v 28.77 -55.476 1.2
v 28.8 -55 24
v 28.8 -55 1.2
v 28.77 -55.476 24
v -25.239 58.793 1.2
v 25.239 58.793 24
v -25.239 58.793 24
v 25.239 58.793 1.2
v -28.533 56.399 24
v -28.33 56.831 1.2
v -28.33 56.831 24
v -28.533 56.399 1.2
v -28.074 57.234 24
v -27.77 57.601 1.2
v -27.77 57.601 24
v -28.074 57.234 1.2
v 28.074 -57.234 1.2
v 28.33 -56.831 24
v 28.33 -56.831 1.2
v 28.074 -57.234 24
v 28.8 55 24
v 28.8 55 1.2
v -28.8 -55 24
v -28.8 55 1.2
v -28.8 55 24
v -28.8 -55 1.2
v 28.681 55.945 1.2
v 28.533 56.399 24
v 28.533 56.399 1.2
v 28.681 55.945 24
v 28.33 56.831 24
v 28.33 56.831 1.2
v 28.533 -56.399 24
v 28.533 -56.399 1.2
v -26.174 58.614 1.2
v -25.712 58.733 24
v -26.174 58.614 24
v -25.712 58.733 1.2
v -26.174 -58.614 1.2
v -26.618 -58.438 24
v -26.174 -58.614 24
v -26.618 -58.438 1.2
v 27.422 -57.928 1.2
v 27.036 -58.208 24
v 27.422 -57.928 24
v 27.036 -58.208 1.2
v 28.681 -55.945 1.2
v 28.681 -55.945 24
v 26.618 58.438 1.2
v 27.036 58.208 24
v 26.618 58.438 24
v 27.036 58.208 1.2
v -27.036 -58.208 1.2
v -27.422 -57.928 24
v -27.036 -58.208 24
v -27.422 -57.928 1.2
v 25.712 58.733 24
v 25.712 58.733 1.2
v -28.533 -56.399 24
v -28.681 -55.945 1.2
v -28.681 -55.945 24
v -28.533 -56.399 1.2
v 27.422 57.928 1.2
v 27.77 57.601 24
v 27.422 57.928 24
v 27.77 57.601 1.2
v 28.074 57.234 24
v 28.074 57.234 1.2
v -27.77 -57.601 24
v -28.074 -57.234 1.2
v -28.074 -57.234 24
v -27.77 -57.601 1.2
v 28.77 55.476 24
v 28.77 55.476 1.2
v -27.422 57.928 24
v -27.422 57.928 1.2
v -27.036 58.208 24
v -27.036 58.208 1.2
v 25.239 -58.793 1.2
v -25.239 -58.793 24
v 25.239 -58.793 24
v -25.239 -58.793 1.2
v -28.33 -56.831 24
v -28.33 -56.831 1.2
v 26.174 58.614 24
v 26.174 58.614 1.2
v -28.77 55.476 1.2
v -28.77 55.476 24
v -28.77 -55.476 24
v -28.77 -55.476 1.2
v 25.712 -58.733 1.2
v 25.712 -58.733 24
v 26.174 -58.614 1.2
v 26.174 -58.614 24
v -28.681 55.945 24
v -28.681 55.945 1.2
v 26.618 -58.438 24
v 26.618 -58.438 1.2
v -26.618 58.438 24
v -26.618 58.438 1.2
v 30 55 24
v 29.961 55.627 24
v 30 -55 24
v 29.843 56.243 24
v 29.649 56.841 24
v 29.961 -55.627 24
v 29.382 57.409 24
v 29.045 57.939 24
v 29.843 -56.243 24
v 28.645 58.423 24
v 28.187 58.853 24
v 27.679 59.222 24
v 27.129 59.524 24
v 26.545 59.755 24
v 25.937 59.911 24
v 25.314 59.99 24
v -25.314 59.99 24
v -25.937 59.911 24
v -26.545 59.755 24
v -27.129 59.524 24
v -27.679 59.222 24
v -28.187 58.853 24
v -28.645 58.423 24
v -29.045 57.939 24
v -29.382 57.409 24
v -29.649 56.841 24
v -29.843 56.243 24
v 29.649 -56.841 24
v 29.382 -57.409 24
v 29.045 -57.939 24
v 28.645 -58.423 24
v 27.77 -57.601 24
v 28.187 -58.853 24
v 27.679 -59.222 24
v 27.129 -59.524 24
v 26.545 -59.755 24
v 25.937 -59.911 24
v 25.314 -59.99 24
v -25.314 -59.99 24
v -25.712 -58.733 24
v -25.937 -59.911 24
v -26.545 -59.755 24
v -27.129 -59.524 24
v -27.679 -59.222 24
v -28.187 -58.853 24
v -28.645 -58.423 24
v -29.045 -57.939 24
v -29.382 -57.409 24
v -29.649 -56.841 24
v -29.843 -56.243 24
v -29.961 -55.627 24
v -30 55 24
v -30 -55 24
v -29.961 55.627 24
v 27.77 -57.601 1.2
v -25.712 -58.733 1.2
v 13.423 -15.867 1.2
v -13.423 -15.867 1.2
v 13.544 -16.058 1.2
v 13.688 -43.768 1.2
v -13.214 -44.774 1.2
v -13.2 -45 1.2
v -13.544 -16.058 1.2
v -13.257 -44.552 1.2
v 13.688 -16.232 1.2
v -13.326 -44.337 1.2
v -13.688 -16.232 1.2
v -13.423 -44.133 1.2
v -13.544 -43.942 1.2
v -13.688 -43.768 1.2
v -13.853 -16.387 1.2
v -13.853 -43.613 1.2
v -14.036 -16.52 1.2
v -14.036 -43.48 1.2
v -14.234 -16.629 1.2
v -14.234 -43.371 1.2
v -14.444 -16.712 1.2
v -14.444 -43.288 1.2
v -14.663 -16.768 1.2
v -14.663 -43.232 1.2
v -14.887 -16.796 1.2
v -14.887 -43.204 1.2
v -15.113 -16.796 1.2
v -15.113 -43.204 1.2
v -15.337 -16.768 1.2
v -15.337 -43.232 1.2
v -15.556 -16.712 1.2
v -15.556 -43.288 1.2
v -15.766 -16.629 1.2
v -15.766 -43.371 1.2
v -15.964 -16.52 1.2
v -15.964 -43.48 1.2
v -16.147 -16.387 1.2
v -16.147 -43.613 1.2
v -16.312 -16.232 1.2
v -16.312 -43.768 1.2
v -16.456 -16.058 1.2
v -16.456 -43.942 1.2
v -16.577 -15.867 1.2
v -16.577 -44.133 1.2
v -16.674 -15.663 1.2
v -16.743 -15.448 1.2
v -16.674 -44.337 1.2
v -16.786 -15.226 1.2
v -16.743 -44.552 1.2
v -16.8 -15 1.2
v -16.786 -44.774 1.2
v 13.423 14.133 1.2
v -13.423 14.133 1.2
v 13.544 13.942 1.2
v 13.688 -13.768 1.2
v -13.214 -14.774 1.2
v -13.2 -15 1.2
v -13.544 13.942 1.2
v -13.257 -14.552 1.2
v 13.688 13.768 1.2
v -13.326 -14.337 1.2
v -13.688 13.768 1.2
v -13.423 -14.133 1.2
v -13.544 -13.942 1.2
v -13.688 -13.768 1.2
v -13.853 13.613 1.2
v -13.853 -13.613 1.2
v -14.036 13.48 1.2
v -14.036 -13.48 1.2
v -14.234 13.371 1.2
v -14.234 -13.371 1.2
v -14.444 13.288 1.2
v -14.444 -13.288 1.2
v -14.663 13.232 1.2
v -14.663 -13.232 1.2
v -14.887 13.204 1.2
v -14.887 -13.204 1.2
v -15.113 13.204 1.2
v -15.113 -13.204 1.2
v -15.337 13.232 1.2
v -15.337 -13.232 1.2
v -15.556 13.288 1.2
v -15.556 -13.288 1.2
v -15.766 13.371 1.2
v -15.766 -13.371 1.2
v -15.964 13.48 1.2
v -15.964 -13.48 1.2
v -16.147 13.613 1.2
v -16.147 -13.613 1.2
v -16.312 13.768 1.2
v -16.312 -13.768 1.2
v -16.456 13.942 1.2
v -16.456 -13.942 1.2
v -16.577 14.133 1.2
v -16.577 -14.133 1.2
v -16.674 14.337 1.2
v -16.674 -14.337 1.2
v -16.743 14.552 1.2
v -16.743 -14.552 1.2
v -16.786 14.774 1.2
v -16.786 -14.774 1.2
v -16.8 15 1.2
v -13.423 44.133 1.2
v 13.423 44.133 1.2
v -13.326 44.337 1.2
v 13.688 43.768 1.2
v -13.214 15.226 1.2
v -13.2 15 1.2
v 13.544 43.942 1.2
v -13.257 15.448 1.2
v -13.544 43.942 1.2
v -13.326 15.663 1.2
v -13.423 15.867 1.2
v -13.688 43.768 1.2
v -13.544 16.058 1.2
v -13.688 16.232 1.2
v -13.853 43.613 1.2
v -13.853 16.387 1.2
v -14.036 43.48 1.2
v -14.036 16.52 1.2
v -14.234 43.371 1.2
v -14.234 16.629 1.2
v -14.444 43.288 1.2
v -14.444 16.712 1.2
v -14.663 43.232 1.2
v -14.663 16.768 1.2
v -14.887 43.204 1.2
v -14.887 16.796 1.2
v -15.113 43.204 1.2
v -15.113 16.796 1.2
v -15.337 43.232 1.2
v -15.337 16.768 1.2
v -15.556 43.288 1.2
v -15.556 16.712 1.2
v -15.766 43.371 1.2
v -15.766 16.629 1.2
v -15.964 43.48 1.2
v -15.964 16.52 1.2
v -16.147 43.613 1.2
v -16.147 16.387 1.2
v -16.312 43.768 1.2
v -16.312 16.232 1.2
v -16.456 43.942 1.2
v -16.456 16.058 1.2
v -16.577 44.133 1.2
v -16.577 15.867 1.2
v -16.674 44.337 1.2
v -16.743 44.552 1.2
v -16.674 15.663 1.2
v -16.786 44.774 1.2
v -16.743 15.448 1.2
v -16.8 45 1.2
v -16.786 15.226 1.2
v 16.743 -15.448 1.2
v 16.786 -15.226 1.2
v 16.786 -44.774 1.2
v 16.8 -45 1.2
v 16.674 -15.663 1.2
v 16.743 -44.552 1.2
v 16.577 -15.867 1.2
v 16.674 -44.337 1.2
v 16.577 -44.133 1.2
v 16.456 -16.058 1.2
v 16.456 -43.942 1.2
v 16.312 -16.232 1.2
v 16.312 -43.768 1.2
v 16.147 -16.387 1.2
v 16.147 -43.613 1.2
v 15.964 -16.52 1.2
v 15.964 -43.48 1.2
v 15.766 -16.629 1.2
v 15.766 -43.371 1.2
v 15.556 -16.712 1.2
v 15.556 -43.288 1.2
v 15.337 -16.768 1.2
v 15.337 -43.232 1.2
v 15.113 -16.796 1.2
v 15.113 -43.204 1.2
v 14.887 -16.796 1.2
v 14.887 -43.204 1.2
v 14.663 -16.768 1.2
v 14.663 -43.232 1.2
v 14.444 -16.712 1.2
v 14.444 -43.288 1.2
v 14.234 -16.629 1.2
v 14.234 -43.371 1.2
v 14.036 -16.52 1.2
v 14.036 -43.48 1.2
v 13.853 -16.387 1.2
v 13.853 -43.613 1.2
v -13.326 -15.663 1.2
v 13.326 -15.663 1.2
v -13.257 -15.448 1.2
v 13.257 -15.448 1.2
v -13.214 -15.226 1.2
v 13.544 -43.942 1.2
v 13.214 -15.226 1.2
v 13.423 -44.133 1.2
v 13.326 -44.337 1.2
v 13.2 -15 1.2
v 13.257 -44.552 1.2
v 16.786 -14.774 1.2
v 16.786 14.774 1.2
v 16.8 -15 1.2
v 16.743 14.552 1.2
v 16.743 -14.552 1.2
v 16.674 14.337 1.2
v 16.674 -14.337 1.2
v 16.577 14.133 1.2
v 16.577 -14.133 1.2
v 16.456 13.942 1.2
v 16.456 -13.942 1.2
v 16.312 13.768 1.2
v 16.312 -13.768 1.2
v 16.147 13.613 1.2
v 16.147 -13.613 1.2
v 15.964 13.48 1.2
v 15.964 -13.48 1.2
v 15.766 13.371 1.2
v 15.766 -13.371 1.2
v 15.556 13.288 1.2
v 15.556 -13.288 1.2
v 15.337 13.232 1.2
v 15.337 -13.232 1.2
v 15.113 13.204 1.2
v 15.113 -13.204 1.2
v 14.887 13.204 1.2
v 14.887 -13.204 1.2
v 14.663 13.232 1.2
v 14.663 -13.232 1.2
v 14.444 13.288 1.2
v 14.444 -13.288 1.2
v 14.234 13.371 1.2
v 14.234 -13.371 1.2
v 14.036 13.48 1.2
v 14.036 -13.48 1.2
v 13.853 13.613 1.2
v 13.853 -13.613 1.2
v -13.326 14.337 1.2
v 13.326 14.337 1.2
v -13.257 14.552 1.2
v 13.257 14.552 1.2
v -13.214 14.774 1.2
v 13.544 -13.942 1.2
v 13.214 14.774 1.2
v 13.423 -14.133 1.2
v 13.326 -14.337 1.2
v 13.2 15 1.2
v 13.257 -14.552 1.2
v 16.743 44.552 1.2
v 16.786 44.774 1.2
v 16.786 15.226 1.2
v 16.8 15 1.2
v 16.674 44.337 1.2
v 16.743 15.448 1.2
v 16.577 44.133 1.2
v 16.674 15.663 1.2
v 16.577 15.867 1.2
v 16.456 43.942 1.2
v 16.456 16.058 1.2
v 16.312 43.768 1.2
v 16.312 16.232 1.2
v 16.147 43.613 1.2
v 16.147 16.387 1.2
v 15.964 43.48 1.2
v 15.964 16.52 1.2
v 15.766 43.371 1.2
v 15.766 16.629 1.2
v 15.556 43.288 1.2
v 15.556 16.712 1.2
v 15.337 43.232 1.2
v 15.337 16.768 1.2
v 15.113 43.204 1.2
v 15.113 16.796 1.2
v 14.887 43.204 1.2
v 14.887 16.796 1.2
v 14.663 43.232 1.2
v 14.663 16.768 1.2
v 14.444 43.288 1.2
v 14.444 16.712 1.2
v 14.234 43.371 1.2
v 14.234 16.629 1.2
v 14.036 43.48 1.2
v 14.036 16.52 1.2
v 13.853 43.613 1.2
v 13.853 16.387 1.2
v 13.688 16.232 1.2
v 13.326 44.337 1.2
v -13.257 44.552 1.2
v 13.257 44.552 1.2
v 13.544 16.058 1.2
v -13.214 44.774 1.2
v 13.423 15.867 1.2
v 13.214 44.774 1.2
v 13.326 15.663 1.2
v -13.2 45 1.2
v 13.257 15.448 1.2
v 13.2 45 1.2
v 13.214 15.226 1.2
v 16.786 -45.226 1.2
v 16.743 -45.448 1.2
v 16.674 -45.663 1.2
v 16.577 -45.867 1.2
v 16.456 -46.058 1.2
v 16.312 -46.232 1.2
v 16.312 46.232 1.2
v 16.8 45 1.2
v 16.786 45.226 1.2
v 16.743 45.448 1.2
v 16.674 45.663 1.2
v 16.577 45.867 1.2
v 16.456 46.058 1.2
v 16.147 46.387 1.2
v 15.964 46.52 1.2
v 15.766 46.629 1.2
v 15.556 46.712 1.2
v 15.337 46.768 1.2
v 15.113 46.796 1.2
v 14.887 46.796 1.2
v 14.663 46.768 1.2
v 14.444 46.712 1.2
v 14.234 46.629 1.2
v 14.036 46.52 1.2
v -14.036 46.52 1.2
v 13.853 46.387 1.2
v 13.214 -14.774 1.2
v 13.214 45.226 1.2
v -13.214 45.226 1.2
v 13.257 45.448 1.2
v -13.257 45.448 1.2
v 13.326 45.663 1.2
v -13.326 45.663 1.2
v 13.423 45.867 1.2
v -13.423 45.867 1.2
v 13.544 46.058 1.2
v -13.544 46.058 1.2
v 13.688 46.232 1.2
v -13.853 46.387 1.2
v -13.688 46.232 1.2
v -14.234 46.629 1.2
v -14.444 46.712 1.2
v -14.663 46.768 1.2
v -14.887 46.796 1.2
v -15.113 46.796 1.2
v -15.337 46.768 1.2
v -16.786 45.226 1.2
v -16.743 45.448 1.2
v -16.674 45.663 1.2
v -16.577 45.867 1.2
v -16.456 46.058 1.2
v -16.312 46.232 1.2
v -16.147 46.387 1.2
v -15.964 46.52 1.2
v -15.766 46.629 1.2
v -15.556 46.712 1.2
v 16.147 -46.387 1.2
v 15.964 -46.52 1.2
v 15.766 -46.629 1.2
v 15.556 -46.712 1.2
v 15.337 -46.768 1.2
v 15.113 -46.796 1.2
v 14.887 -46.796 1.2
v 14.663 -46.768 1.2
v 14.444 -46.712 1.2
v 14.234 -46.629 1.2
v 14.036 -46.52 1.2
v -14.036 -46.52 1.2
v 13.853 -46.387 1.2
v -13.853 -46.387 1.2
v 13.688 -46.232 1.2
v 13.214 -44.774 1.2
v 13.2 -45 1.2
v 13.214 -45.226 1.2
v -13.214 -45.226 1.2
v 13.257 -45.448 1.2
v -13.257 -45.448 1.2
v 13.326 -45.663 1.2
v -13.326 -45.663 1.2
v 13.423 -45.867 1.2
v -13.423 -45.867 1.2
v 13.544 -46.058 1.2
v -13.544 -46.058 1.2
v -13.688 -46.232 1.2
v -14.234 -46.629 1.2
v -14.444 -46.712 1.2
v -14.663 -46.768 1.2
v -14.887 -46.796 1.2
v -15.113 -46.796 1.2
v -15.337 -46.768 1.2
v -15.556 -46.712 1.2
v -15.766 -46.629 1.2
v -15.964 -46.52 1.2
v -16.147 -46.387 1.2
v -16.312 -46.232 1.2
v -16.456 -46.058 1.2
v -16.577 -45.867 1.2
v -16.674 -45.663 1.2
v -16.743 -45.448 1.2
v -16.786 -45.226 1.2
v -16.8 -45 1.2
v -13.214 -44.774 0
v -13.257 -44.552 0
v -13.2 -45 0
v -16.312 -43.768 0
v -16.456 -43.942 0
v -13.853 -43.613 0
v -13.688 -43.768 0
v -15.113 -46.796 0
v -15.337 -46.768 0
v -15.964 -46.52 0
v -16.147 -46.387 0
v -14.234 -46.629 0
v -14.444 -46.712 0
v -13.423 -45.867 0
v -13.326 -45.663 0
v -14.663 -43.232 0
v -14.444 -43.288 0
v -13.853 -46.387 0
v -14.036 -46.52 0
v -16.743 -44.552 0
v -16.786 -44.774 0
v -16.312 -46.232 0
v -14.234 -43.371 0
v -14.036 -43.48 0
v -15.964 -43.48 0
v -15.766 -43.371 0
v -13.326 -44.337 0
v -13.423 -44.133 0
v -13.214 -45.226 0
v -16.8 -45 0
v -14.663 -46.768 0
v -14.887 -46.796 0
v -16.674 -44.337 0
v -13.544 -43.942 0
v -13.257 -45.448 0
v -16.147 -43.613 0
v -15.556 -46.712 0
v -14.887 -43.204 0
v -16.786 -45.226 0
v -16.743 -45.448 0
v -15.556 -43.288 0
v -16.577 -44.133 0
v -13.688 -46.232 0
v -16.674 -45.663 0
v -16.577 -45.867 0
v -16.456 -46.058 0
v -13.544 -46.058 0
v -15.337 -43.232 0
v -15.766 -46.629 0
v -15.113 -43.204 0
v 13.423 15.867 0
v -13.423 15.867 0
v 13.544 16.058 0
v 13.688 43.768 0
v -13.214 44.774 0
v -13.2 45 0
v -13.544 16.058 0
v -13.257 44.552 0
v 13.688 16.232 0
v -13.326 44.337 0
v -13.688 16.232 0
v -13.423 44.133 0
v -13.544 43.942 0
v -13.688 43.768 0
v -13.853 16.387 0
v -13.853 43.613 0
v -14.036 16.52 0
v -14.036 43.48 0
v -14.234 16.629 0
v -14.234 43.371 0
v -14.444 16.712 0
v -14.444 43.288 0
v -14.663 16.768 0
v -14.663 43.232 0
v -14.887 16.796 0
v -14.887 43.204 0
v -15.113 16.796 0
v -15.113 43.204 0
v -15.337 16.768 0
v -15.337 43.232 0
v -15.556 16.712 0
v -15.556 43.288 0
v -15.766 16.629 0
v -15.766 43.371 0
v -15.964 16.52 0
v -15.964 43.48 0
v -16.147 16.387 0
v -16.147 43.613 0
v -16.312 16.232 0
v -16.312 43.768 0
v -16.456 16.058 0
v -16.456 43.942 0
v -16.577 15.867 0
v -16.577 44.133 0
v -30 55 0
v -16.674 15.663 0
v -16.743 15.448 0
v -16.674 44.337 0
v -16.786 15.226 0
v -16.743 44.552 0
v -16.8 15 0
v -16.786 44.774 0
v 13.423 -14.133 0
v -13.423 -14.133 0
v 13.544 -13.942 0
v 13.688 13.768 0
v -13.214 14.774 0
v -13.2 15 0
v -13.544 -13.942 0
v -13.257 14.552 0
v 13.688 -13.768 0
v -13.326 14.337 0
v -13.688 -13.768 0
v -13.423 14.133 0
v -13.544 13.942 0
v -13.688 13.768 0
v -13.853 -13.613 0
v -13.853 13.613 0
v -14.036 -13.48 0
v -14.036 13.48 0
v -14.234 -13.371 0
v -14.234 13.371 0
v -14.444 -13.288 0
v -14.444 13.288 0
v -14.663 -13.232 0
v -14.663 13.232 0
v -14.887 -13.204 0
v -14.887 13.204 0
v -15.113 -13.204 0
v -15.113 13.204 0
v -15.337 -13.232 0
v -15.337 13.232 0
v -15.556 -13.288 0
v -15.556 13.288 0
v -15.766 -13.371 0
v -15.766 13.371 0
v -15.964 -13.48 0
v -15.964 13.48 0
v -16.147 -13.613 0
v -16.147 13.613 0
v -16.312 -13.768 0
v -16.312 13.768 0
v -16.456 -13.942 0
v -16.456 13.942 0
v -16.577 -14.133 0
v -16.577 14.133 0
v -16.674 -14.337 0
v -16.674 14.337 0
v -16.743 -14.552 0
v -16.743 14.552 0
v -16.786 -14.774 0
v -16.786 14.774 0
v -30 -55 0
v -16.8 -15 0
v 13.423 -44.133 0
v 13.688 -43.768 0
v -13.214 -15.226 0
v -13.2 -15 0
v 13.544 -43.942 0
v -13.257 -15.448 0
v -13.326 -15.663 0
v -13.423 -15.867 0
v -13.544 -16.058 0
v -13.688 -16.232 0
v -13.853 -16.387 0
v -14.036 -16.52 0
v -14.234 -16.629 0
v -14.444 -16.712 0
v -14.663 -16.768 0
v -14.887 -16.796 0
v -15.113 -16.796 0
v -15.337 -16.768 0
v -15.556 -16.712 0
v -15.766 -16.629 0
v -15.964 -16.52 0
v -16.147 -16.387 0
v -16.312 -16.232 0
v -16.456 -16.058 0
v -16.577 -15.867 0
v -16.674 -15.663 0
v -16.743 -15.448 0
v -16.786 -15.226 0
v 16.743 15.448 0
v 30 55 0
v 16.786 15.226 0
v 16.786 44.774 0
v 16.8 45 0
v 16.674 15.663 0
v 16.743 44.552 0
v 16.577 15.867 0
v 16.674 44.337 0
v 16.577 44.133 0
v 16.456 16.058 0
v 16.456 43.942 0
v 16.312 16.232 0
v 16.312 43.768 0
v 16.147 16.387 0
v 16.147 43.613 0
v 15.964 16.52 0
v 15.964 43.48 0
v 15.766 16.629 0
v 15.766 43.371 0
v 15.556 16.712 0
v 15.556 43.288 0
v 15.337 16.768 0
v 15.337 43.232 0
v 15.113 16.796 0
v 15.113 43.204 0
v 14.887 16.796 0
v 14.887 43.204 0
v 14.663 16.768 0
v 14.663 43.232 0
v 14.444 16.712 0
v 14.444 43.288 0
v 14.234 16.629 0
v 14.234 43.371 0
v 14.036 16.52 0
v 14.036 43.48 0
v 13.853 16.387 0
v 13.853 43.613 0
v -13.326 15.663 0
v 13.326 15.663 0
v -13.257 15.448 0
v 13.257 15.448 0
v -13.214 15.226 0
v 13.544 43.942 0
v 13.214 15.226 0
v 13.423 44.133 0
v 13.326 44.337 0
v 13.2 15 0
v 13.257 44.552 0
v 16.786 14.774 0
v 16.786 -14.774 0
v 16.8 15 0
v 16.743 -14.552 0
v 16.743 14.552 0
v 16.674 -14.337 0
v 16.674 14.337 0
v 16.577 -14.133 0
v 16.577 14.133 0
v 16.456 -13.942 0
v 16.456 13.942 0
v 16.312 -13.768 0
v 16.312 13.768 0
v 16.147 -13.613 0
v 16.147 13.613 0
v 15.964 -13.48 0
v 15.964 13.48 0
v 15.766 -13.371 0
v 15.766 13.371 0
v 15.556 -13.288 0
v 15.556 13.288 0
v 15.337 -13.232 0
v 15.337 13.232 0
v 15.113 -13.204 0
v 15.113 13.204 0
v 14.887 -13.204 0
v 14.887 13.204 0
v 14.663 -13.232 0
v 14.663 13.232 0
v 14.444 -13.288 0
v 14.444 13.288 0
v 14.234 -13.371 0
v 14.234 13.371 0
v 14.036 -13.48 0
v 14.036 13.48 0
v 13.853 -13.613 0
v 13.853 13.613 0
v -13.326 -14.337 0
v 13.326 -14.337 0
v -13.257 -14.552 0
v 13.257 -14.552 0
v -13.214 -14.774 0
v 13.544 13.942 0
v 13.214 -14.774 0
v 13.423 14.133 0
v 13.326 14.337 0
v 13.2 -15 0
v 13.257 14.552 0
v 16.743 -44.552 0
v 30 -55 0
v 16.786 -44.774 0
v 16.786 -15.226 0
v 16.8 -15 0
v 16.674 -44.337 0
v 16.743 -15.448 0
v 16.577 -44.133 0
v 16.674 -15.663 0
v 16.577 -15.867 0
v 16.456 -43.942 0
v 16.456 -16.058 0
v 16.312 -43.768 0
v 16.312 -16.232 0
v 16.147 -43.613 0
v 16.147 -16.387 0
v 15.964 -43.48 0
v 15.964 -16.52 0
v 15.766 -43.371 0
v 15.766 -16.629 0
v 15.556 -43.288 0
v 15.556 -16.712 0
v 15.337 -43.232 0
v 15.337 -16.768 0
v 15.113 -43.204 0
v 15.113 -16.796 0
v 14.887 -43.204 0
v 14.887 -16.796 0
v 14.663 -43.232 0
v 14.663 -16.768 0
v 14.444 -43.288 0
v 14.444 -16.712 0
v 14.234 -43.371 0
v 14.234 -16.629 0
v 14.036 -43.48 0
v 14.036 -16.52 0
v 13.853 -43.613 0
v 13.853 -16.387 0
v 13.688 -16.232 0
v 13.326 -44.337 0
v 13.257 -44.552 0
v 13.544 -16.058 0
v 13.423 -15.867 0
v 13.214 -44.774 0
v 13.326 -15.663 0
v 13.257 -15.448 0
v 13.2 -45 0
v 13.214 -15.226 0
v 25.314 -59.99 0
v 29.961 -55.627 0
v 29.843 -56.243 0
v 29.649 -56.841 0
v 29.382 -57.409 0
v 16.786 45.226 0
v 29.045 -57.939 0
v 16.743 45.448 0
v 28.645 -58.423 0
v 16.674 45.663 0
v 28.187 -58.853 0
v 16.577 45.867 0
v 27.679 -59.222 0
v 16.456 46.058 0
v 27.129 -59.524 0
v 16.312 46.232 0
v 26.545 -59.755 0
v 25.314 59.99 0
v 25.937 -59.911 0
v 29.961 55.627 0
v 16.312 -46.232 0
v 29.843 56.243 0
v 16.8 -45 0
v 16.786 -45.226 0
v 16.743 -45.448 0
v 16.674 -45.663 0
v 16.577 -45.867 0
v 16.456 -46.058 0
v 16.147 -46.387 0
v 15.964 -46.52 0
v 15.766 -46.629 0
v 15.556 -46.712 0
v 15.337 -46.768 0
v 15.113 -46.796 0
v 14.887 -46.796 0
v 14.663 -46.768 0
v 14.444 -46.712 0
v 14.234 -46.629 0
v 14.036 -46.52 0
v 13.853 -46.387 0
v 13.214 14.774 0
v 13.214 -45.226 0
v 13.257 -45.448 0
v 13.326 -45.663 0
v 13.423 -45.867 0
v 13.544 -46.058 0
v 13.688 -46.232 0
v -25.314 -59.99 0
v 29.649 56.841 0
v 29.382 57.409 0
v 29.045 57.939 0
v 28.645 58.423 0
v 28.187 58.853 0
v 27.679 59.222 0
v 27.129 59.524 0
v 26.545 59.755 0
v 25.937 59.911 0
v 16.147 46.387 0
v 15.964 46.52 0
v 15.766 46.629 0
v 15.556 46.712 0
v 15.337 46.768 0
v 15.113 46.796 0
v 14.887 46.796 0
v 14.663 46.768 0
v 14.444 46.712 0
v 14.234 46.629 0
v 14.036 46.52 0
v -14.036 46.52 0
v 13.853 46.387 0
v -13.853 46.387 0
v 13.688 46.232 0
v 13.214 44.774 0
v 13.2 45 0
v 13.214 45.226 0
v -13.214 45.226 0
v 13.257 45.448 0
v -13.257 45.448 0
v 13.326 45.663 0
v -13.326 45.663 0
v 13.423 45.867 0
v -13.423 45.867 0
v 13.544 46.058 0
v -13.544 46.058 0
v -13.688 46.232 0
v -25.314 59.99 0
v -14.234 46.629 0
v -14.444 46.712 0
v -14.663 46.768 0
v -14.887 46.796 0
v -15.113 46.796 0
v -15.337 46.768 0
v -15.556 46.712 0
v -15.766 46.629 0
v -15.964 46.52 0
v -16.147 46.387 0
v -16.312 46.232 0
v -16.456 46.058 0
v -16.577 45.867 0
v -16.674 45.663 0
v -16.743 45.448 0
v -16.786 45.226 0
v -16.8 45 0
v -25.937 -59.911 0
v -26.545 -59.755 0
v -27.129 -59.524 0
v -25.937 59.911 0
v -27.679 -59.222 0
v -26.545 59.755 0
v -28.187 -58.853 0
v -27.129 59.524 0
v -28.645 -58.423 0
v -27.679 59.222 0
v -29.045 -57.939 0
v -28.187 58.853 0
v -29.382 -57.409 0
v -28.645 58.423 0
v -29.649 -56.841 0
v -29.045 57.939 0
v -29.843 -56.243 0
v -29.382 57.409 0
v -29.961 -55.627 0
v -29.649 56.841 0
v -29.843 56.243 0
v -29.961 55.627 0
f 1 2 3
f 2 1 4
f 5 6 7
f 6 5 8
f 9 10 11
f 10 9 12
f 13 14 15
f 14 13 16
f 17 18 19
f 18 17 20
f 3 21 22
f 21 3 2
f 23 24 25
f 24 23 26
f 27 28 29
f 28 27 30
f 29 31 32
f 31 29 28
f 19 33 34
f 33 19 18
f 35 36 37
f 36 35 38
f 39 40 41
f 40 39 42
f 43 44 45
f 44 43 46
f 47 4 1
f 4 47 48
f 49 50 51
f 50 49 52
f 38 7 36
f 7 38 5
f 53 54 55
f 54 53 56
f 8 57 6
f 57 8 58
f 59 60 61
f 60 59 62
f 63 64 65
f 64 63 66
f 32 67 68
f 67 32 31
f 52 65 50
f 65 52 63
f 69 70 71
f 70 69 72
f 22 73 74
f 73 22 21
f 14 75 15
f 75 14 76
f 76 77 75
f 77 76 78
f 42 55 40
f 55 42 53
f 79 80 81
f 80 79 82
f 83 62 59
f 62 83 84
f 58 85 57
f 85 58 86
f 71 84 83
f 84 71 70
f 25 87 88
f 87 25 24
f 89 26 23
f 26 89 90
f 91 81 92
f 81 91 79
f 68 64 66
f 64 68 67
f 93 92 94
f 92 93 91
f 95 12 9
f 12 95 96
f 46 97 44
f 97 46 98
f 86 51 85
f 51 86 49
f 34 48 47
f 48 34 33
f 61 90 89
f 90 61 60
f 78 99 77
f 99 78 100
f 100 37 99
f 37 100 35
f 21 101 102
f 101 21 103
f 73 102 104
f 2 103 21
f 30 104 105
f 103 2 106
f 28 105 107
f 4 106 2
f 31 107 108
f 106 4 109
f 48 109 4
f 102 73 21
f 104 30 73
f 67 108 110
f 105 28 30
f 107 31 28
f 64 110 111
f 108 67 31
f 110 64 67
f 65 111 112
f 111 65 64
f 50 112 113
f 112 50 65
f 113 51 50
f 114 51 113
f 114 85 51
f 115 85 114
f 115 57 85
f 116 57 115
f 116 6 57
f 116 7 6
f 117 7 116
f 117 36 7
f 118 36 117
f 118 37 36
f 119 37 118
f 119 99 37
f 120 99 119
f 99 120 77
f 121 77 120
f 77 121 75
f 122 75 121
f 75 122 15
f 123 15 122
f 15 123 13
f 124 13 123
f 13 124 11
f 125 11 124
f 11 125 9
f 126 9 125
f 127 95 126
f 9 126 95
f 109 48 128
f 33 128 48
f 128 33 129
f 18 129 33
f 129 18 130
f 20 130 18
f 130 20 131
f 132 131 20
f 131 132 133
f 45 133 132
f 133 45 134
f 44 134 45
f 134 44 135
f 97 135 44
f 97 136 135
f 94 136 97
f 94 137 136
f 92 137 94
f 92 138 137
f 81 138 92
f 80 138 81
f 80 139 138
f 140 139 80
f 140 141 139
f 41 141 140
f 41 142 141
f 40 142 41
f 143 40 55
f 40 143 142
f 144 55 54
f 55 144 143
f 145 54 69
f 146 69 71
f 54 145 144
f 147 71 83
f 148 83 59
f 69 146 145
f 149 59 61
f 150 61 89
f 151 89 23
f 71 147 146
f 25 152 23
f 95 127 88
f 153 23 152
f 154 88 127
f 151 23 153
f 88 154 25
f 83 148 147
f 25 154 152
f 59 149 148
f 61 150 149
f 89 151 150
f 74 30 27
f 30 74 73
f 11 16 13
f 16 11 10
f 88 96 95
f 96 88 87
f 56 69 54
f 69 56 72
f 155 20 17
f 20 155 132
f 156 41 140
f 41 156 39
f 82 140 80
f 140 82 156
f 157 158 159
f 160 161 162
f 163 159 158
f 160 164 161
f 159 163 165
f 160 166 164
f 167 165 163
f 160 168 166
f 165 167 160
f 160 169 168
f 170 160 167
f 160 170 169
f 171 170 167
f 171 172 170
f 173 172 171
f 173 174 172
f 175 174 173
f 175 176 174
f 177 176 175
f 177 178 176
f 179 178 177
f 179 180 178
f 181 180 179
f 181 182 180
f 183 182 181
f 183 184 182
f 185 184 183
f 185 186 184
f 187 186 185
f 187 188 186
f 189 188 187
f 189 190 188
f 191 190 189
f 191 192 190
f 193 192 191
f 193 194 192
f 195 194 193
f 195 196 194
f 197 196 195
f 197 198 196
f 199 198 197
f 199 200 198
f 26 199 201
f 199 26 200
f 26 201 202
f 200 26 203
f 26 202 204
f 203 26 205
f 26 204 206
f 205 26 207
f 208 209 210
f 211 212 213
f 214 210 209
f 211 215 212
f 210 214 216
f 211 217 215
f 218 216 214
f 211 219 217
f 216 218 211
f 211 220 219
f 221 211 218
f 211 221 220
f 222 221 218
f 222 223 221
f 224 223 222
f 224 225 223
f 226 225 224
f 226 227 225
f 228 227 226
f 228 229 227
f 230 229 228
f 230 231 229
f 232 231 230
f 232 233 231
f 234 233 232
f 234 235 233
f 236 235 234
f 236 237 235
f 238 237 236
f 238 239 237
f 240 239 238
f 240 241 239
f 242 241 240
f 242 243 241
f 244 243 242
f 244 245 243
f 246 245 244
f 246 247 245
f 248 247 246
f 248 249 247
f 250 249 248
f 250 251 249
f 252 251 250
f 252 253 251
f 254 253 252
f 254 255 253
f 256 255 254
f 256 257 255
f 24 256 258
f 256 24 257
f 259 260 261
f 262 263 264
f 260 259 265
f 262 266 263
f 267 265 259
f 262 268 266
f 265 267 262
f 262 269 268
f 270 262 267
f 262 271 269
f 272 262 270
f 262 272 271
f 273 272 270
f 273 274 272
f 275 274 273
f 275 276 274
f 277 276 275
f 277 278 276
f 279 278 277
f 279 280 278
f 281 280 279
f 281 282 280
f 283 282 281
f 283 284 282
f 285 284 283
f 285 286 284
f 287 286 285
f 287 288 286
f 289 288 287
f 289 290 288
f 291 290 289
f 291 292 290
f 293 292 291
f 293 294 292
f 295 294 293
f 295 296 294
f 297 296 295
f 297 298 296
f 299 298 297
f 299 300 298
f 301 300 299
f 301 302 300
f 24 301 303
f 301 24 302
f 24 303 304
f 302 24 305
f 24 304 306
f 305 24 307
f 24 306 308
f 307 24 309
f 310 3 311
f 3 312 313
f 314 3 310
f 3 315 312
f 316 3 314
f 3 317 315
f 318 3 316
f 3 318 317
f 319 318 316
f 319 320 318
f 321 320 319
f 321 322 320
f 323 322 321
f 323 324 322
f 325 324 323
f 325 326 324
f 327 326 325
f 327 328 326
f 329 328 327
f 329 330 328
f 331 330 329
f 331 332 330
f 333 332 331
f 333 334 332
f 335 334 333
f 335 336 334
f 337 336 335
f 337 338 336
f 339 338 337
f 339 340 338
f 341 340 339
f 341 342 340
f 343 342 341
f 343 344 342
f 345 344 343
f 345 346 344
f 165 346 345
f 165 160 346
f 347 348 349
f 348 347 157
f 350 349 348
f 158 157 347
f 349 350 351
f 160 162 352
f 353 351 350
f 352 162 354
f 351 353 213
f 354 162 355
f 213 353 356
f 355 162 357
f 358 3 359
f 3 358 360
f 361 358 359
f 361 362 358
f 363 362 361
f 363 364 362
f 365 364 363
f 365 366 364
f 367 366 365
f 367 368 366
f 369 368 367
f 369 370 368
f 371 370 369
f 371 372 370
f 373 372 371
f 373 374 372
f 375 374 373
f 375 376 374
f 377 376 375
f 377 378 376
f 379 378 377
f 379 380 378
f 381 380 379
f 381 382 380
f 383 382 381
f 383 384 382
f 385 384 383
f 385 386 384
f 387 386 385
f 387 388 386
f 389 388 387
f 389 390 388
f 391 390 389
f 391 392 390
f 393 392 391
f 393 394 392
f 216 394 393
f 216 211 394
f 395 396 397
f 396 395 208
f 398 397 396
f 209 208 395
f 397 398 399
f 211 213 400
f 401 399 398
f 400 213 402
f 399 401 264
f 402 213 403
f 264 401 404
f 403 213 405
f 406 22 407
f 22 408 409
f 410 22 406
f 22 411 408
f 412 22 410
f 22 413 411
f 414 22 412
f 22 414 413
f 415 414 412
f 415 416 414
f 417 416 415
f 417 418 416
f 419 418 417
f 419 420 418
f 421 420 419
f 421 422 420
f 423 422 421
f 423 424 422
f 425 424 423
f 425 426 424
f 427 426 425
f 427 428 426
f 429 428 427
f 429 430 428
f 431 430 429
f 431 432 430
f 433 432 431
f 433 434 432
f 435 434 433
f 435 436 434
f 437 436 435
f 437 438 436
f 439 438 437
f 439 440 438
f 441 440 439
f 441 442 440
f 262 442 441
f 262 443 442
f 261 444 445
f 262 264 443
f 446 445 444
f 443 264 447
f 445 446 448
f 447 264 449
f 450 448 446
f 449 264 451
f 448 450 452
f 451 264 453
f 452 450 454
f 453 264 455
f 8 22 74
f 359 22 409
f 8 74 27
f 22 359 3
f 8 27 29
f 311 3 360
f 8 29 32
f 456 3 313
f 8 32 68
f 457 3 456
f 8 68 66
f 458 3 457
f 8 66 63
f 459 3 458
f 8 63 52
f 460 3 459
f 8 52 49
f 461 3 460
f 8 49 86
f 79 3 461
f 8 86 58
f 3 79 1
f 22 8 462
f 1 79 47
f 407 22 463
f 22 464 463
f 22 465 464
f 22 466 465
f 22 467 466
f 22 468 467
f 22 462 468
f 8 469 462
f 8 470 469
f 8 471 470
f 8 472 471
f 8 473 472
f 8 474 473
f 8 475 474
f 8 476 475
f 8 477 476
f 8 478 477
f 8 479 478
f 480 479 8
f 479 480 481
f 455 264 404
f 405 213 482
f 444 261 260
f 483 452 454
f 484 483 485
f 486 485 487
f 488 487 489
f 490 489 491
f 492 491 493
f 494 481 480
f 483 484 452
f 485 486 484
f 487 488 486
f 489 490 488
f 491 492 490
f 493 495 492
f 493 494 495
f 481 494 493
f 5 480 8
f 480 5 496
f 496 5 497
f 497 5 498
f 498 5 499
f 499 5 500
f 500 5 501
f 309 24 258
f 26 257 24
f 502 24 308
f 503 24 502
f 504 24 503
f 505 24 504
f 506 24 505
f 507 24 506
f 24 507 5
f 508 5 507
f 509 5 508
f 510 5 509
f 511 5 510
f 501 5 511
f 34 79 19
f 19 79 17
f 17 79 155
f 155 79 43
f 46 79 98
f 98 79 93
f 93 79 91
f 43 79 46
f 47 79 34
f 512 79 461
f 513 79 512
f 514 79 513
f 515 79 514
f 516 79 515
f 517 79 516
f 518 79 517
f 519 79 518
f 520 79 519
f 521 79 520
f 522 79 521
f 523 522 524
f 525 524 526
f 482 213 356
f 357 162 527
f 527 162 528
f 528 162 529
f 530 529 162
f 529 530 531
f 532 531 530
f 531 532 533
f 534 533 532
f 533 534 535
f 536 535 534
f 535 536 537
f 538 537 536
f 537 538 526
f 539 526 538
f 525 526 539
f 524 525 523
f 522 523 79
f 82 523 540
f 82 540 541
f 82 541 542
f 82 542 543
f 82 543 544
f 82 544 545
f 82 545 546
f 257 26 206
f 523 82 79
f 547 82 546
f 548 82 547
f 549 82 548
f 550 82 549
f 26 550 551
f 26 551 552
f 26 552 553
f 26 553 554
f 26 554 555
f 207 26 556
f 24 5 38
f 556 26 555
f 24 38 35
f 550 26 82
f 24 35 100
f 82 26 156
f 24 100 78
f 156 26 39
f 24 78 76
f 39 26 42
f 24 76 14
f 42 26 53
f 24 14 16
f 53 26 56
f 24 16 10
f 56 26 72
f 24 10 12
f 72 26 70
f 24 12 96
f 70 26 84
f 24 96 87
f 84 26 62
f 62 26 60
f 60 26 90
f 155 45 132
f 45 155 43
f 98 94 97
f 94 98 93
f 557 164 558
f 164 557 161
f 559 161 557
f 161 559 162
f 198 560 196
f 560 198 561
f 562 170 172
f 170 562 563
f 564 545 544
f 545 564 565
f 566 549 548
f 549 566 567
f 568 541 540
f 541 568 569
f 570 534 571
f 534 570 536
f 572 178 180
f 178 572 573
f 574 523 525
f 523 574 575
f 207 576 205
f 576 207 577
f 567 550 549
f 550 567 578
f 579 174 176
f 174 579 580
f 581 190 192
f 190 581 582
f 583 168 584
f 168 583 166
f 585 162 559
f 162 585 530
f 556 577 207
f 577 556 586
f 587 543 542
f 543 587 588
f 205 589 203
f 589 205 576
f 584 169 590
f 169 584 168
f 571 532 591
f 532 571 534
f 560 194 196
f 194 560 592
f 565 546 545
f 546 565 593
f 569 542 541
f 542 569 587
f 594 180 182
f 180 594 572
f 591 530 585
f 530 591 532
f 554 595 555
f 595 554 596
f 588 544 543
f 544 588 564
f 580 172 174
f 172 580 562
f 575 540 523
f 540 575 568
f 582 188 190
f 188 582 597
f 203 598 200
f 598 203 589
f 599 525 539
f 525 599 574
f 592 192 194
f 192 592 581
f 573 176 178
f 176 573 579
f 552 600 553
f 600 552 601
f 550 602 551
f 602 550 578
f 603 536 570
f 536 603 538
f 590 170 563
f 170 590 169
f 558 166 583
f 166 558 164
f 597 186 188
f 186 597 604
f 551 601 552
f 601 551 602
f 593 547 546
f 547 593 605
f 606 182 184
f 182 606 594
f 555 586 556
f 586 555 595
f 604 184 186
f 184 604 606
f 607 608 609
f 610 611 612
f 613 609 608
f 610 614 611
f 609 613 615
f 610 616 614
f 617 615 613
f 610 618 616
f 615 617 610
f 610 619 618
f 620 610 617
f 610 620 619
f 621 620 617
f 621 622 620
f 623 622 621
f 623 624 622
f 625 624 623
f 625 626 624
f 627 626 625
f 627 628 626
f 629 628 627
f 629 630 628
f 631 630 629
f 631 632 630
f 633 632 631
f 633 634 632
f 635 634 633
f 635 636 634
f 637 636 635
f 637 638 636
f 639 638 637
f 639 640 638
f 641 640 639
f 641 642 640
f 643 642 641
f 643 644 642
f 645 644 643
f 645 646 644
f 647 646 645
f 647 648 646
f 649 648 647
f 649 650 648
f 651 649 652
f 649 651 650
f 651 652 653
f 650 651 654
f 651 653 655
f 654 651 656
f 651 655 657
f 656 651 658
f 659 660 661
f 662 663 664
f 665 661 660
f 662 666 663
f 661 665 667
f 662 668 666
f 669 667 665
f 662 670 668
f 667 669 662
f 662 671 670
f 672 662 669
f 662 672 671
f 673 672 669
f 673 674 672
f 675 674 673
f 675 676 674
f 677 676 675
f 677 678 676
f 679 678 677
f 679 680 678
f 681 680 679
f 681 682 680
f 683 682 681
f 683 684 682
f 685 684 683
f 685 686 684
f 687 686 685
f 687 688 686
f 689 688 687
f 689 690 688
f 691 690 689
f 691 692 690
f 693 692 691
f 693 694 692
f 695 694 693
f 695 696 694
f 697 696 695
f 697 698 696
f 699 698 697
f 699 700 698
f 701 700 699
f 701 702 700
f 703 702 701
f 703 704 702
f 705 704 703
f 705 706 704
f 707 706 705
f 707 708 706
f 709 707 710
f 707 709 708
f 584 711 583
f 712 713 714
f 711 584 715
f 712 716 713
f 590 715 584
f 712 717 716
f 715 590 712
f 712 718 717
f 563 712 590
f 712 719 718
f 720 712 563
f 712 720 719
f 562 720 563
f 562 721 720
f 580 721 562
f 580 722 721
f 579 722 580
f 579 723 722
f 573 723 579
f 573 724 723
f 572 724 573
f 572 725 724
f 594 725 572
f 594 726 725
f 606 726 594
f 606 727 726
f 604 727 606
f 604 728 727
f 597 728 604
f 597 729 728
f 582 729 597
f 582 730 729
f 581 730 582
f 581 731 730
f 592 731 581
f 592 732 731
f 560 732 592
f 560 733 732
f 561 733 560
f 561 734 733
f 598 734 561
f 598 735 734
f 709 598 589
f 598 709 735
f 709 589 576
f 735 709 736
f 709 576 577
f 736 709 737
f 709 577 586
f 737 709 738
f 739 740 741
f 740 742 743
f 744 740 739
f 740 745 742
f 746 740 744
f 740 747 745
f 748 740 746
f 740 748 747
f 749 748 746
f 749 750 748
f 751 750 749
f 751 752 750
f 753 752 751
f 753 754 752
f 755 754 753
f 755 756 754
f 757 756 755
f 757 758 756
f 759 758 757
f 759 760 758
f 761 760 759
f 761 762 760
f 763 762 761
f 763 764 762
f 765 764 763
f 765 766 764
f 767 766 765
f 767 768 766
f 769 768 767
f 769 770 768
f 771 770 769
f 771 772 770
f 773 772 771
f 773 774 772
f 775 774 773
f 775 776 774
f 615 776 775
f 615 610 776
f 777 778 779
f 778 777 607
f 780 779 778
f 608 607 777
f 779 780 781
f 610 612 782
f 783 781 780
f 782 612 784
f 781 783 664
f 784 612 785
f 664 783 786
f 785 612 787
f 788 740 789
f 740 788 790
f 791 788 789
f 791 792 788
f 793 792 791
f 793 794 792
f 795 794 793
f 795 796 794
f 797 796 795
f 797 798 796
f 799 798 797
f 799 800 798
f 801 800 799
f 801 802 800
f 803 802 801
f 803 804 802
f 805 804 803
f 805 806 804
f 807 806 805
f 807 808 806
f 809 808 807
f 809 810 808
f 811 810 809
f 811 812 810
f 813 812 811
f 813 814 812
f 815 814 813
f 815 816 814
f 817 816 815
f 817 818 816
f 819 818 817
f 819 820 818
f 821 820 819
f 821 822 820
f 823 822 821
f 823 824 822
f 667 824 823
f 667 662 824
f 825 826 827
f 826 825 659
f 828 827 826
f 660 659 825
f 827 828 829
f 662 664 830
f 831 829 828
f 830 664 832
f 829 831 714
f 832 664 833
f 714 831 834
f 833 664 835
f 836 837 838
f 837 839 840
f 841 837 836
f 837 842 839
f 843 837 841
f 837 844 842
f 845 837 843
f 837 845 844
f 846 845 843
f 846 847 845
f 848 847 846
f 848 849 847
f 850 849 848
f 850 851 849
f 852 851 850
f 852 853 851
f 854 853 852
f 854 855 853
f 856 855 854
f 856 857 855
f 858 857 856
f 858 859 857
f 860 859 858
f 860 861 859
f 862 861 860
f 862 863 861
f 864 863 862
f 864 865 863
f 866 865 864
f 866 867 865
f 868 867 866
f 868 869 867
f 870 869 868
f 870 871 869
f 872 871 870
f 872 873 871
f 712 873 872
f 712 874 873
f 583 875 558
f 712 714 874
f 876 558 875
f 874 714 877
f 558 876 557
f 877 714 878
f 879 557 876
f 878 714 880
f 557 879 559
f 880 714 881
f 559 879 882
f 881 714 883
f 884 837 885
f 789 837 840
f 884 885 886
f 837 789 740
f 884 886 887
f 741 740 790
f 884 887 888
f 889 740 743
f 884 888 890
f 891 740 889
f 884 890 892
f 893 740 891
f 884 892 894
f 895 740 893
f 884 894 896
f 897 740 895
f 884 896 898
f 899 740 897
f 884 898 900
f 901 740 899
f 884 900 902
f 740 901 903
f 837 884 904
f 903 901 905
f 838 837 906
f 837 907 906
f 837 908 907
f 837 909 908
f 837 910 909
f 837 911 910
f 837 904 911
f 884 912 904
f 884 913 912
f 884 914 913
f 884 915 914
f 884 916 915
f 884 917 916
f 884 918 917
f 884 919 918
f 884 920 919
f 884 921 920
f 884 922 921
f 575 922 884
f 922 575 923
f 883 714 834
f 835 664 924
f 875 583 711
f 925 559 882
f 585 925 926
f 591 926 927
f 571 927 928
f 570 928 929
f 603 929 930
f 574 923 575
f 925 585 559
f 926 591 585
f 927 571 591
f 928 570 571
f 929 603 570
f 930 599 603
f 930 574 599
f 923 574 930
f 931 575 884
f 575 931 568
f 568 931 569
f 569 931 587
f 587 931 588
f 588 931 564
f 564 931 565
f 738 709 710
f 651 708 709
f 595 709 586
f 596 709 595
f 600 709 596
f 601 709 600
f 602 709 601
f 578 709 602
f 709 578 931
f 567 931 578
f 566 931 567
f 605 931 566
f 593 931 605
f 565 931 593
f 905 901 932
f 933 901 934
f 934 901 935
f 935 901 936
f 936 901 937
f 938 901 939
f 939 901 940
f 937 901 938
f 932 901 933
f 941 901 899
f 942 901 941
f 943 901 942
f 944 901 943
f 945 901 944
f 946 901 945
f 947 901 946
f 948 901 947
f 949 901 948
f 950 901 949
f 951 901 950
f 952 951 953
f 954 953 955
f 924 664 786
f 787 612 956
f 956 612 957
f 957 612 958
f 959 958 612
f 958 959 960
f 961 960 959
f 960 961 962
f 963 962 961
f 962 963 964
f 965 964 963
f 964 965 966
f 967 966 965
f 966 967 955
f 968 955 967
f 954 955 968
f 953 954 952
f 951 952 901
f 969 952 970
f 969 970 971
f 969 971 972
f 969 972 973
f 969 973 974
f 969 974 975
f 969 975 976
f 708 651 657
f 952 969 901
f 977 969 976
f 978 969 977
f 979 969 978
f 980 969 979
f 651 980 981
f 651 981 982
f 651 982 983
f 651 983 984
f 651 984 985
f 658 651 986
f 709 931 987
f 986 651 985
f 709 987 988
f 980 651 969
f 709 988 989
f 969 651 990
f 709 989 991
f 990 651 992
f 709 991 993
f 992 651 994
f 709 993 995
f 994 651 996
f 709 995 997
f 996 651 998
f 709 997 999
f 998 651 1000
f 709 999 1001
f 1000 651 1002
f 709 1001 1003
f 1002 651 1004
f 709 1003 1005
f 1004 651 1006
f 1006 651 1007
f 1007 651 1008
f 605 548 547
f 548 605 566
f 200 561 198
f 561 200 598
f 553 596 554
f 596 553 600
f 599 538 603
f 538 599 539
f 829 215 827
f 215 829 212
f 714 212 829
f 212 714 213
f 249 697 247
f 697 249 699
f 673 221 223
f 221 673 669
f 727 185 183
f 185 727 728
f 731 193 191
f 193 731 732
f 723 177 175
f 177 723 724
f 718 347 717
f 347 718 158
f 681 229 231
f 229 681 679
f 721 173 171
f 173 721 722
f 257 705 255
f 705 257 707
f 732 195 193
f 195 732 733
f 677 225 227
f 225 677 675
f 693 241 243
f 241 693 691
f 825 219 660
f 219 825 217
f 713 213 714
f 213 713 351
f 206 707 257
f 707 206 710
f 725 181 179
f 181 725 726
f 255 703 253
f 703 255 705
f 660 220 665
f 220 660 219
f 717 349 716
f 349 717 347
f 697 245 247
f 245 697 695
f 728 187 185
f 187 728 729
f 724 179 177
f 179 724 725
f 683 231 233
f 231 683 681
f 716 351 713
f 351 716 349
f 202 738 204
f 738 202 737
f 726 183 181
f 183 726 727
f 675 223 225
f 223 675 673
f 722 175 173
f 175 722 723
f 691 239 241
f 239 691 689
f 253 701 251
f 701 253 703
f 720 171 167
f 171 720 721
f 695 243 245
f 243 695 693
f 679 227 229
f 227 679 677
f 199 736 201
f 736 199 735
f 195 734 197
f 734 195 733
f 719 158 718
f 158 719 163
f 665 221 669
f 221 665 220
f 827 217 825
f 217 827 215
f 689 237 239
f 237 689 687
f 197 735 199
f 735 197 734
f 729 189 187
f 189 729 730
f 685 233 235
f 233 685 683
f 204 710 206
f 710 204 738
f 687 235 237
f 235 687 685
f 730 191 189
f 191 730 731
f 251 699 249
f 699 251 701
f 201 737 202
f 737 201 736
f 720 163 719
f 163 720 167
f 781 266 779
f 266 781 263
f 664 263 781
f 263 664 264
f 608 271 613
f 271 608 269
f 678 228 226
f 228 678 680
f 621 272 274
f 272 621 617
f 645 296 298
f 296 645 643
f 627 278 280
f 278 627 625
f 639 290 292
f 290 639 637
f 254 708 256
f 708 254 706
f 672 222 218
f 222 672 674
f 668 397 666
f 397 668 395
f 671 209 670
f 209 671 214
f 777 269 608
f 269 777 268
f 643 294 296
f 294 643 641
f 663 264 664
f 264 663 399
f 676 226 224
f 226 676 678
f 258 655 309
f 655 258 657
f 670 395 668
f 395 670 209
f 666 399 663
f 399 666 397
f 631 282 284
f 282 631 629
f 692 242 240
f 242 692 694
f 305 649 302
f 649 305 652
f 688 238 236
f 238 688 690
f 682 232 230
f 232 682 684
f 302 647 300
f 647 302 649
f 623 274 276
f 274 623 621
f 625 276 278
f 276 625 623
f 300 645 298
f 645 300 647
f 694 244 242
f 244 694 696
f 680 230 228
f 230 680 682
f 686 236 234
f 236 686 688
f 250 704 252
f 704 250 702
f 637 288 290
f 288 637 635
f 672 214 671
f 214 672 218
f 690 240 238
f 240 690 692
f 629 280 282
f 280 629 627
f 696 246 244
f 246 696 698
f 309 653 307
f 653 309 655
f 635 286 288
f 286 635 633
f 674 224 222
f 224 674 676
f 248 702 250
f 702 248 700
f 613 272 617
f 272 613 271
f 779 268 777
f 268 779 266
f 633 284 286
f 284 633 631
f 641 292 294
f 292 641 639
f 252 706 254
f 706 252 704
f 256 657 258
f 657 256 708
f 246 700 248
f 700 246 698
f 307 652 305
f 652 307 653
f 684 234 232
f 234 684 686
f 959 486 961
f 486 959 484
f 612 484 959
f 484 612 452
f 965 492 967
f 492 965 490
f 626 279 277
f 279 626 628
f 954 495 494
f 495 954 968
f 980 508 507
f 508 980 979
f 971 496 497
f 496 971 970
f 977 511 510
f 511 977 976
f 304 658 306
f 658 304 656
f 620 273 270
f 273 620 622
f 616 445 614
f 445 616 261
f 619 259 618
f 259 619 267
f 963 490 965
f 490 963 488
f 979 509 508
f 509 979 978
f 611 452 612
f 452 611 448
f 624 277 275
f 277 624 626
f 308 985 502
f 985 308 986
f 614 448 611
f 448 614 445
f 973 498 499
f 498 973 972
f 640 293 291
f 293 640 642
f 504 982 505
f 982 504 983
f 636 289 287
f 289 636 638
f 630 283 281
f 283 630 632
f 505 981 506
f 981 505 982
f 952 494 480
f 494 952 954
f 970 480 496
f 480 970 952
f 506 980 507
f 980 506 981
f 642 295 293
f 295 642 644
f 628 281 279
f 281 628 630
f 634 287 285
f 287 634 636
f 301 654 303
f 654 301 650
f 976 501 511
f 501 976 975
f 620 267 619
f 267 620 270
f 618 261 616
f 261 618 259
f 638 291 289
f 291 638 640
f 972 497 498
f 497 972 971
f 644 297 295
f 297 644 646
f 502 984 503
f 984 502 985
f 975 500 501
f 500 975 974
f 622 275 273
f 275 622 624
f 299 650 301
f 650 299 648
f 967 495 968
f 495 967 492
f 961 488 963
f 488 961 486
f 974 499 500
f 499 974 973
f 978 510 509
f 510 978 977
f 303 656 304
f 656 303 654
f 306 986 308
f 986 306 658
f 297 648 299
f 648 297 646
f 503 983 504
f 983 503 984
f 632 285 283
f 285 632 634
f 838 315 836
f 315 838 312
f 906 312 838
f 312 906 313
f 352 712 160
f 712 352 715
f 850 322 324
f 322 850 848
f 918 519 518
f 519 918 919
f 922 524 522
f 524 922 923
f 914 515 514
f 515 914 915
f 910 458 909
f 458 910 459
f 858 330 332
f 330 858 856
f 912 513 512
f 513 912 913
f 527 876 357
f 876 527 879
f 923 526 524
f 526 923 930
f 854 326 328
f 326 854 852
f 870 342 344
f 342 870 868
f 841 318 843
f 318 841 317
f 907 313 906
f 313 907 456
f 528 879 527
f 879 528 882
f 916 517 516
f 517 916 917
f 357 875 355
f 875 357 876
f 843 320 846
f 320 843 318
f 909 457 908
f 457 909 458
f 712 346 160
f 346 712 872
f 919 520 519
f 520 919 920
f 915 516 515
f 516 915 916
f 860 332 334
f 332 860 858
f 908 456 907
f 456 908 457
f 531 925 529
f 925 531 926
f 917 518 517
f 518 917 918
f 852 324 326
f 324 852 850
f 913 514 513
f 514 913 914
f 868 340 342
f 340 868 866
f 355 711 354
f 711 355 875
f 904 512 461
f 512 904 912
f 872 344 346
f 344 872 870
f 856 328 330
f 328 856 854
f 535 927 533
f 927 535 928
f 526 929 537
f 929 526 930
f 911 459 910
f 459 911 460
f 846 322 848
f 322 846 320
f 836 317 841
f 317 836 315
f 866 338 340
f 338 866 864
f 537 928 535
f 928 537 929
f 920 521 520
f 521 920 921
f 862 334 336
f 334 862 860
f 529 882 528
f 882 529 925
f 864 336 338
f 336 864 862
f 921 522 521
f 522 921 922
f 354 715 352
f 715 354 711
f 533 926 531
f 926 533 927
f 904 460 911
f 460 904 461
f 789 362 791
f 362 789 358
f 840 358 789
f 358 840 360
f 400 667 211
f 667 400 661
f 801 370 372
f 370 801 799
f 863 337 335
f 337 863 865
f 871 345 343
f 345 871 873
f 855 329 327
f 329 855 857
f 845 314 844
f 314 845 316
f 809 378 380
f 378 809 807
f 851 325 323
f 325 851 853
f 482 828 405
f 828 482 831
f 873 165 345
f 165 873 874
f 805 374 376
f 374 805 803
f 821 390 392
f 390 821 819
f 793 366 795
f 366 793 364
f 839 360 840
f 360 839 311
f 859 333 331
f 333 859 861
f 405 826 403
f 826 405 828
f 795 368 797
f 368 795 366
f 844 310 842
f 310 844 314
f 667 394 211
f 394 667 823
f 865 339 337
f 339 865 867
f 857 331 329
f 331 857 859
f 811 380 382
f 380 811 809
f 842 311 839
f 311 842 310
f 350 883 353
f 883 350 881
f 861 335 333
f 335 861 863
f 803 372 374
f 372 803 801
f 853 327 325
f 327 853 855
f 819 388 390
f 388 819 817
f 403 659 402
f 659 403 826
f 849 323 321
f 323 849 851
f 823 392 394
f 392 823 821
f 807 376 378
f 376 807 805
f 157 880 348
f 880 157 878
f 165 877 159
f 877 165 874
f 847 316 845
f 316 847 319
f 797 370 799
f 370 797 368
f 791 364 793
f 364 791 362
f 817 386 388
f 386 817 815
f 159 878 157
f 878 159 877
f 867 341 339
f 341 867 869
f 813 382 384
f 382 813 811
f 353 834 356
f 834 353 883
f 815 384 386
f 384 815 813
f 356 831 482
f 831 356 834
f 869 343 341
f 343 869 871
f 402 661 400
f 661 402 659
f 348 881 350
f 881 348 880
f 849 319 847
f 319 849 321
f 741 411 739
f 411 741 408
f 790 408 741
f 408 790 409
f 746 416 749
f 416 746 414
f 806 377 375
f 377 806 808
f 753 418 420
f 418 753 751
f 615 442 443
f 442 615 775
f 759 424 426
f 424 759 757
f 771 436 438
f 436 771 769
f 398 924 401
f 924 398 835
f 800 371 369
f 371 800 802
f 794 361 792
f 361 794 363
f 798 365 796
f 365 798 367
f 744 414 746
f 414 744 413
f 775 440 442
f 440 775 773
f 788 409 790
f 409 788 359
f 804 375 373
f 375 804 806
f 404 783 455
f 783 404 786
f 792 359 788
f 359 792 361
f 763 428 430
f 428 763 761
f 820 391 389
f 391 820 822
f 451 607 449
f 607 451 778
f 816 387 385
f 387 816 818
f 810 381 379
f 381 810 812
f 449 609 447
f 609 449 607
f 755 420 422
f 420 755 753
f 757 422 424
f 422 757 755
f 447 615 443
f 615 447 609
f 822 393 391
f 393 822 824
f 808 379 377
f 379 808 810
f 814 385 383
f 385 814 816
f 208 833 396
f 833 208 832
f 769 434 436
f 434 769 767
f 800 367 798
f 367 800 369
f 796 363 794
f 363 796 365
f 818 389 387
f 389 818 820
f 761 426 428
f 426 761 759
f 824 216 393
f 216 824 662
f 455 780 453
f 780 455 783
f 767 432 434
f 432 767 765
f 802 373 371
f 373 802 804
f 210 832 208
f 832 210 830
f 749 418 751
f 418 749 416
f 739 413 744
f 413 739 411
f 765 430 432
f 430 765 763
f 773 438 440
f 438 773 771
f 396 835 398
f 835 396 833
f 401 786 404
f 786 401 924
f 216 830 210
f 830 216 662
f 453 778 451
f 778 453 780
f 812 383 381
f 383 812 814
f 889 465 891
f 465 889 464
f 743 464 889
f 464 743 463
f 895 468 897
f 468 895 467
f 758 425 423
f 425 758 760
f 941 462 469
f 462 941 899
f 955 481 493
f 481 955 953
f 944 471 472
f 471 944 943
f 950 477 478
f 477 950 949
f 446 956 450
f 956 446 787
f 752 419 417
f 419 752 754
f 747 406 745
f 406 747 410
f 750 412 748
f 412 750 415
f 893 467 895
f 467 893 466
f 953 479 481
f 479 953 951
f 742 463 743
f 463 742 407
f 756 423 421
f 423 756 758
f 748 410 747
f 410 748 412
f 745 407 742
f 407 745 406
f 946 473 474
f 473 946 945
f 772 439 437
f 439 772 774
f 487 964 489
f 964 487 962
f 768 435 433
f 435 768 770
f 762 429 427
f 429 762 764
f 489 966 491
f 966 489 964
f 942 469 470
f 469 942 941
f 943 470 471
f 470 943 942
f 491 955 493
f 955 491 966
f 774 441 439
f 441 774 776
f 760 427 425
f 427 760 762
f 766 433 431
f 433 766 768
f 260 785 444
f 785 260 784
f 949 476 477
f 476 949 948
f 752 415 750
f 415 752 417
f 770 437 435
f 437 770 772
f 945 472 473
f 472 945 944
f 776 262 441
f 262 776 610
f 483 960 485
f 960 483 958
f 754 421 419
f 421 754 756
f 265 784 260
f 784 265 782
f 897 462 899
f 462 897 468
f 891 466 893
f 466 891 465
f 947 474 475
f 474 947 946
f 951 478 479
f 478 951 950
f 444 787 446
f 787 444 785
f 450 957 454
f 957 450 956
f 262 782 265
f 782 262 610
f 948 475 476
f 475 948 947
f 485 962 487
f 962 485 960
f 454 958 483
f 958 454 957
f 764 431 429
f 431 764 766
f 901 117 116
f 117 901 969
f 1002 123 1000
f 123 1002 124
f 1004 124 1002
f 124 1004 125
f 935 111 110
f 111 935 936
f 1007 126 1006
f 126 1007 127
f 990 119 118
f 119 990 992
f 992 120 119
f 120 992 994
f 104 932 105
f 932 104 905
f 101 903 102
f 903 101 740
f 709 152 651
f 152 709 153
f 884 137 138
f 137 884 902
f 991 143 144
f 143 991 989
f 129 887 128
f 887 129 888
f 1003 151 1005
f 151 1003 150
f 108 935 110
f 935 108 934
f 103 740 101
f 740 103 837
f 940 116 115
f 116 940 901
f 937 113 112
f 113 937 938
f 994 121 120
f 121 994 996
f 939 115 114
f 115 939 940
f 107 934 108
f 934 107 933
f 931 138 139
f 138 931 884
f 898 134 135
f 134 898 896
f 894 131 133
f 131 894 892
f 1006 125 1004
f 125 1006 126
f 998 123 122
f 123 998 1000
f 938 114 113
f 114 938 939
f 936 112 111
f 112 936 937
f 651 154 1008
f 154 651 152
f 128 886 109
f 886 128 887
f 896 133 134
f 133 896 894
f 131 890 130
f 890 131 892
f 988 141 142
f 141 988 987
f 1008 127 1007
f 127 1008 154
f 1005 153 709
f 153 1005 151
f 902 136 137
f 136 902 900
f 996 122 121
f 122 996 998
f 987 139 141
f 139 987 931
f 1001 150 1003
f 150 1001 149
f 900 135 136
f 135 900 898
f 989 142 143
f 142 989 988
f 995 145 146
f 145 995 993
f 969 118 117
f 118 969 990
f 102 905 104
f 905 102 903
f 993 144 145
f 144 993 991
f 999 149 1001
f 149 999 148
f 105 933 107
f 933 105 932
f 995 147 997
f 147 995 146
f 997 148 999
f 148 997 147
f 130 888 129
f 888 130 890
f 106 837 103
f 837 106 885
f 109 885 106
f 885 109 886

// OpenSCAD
$fn = 50;


difference() {
	union() {
		hull() {
			translate(v = [-25.0000000000, 55.0000000000, 0]) {
				cylinder(h = 24, r = 5);
			}
			translate(v = [25.0000000000, 55.0000000000, 0]) {
				cylinder(h = 24, r = 5);
			}
			translate(v = [-25.0000000000, -55.0000000000, 0]) {
				cylinder(h = 24, r = 5);
			}
			translate(v = [25.0000000000, -55.0000000000, 0]) {
				cylinder(h = 24, r = 5);
			}
		}
	}
	union() {
		translate(v = [0, 0, 1.2000000000]) {
			hull() {
				translate(v = [-25.0000000000, 55.0000000000, 0]) {
					cylinder(h = 22.8000000000, r = 3.8000000000);
				}
				translate(v = [25.0000000000, 55.0000000000, 0]) {
					cylinder(h = 22.8000000000, r = 3.8000000000);
				}
				translate(v = [-25.0000000000, -55.0000000000, 0]) {
					cylinder(h = 22.8000000000, r = 3.8000000000);
				}
				translate(v = [25.0000000000, -55.0000000000, 0]) {
					cylinder(h = 22.8000000000, r = 3.8000000000);
				}
			}
		}
		#translate(v = [-15.0000000000, -45.0000000000, 0]) {
			cylinder(h = 1.2000000000, r = 1.8000000000);
		}
		#translate(v = [-15.0000000000, -15.0000000000, 0]) {
			cylinder(h = 1.2000000000, r = 1.8000000000);
		}
		#translate(v = [-15.0000000000, 15.0000000000, 0]) {
			cylinder(h = 1.2000000000, r = 1.8000000000);
		}
		#translate(v = [-15.0000000000, 45.0000000000, 0]) {
			cylinder(h = 1.2000000000, r = 1.8000000000);
		}
		#translate(v = [15.0000000000, -45.0000000000, 0]) {
			cylinder(h = 1.2000000000, r = 1.8000000000);
		}
		#translate(v = [15.0000000000, -15.0000000000, 0]) {
			cylinder(h = 1.2000000000, r = 1.8000000000);
		}
		#translate(v = [15.0000000000, 15.0000000000, 0]) {
			cylinder(h = 1.2000000000, r = 1.8000000000);
		}
		#translate(v = [15.0000000000, 45.0000000000, 0]) {
			cylinder(h = 1.2000000000, r = 1.8000000000);
		}
	}
}
